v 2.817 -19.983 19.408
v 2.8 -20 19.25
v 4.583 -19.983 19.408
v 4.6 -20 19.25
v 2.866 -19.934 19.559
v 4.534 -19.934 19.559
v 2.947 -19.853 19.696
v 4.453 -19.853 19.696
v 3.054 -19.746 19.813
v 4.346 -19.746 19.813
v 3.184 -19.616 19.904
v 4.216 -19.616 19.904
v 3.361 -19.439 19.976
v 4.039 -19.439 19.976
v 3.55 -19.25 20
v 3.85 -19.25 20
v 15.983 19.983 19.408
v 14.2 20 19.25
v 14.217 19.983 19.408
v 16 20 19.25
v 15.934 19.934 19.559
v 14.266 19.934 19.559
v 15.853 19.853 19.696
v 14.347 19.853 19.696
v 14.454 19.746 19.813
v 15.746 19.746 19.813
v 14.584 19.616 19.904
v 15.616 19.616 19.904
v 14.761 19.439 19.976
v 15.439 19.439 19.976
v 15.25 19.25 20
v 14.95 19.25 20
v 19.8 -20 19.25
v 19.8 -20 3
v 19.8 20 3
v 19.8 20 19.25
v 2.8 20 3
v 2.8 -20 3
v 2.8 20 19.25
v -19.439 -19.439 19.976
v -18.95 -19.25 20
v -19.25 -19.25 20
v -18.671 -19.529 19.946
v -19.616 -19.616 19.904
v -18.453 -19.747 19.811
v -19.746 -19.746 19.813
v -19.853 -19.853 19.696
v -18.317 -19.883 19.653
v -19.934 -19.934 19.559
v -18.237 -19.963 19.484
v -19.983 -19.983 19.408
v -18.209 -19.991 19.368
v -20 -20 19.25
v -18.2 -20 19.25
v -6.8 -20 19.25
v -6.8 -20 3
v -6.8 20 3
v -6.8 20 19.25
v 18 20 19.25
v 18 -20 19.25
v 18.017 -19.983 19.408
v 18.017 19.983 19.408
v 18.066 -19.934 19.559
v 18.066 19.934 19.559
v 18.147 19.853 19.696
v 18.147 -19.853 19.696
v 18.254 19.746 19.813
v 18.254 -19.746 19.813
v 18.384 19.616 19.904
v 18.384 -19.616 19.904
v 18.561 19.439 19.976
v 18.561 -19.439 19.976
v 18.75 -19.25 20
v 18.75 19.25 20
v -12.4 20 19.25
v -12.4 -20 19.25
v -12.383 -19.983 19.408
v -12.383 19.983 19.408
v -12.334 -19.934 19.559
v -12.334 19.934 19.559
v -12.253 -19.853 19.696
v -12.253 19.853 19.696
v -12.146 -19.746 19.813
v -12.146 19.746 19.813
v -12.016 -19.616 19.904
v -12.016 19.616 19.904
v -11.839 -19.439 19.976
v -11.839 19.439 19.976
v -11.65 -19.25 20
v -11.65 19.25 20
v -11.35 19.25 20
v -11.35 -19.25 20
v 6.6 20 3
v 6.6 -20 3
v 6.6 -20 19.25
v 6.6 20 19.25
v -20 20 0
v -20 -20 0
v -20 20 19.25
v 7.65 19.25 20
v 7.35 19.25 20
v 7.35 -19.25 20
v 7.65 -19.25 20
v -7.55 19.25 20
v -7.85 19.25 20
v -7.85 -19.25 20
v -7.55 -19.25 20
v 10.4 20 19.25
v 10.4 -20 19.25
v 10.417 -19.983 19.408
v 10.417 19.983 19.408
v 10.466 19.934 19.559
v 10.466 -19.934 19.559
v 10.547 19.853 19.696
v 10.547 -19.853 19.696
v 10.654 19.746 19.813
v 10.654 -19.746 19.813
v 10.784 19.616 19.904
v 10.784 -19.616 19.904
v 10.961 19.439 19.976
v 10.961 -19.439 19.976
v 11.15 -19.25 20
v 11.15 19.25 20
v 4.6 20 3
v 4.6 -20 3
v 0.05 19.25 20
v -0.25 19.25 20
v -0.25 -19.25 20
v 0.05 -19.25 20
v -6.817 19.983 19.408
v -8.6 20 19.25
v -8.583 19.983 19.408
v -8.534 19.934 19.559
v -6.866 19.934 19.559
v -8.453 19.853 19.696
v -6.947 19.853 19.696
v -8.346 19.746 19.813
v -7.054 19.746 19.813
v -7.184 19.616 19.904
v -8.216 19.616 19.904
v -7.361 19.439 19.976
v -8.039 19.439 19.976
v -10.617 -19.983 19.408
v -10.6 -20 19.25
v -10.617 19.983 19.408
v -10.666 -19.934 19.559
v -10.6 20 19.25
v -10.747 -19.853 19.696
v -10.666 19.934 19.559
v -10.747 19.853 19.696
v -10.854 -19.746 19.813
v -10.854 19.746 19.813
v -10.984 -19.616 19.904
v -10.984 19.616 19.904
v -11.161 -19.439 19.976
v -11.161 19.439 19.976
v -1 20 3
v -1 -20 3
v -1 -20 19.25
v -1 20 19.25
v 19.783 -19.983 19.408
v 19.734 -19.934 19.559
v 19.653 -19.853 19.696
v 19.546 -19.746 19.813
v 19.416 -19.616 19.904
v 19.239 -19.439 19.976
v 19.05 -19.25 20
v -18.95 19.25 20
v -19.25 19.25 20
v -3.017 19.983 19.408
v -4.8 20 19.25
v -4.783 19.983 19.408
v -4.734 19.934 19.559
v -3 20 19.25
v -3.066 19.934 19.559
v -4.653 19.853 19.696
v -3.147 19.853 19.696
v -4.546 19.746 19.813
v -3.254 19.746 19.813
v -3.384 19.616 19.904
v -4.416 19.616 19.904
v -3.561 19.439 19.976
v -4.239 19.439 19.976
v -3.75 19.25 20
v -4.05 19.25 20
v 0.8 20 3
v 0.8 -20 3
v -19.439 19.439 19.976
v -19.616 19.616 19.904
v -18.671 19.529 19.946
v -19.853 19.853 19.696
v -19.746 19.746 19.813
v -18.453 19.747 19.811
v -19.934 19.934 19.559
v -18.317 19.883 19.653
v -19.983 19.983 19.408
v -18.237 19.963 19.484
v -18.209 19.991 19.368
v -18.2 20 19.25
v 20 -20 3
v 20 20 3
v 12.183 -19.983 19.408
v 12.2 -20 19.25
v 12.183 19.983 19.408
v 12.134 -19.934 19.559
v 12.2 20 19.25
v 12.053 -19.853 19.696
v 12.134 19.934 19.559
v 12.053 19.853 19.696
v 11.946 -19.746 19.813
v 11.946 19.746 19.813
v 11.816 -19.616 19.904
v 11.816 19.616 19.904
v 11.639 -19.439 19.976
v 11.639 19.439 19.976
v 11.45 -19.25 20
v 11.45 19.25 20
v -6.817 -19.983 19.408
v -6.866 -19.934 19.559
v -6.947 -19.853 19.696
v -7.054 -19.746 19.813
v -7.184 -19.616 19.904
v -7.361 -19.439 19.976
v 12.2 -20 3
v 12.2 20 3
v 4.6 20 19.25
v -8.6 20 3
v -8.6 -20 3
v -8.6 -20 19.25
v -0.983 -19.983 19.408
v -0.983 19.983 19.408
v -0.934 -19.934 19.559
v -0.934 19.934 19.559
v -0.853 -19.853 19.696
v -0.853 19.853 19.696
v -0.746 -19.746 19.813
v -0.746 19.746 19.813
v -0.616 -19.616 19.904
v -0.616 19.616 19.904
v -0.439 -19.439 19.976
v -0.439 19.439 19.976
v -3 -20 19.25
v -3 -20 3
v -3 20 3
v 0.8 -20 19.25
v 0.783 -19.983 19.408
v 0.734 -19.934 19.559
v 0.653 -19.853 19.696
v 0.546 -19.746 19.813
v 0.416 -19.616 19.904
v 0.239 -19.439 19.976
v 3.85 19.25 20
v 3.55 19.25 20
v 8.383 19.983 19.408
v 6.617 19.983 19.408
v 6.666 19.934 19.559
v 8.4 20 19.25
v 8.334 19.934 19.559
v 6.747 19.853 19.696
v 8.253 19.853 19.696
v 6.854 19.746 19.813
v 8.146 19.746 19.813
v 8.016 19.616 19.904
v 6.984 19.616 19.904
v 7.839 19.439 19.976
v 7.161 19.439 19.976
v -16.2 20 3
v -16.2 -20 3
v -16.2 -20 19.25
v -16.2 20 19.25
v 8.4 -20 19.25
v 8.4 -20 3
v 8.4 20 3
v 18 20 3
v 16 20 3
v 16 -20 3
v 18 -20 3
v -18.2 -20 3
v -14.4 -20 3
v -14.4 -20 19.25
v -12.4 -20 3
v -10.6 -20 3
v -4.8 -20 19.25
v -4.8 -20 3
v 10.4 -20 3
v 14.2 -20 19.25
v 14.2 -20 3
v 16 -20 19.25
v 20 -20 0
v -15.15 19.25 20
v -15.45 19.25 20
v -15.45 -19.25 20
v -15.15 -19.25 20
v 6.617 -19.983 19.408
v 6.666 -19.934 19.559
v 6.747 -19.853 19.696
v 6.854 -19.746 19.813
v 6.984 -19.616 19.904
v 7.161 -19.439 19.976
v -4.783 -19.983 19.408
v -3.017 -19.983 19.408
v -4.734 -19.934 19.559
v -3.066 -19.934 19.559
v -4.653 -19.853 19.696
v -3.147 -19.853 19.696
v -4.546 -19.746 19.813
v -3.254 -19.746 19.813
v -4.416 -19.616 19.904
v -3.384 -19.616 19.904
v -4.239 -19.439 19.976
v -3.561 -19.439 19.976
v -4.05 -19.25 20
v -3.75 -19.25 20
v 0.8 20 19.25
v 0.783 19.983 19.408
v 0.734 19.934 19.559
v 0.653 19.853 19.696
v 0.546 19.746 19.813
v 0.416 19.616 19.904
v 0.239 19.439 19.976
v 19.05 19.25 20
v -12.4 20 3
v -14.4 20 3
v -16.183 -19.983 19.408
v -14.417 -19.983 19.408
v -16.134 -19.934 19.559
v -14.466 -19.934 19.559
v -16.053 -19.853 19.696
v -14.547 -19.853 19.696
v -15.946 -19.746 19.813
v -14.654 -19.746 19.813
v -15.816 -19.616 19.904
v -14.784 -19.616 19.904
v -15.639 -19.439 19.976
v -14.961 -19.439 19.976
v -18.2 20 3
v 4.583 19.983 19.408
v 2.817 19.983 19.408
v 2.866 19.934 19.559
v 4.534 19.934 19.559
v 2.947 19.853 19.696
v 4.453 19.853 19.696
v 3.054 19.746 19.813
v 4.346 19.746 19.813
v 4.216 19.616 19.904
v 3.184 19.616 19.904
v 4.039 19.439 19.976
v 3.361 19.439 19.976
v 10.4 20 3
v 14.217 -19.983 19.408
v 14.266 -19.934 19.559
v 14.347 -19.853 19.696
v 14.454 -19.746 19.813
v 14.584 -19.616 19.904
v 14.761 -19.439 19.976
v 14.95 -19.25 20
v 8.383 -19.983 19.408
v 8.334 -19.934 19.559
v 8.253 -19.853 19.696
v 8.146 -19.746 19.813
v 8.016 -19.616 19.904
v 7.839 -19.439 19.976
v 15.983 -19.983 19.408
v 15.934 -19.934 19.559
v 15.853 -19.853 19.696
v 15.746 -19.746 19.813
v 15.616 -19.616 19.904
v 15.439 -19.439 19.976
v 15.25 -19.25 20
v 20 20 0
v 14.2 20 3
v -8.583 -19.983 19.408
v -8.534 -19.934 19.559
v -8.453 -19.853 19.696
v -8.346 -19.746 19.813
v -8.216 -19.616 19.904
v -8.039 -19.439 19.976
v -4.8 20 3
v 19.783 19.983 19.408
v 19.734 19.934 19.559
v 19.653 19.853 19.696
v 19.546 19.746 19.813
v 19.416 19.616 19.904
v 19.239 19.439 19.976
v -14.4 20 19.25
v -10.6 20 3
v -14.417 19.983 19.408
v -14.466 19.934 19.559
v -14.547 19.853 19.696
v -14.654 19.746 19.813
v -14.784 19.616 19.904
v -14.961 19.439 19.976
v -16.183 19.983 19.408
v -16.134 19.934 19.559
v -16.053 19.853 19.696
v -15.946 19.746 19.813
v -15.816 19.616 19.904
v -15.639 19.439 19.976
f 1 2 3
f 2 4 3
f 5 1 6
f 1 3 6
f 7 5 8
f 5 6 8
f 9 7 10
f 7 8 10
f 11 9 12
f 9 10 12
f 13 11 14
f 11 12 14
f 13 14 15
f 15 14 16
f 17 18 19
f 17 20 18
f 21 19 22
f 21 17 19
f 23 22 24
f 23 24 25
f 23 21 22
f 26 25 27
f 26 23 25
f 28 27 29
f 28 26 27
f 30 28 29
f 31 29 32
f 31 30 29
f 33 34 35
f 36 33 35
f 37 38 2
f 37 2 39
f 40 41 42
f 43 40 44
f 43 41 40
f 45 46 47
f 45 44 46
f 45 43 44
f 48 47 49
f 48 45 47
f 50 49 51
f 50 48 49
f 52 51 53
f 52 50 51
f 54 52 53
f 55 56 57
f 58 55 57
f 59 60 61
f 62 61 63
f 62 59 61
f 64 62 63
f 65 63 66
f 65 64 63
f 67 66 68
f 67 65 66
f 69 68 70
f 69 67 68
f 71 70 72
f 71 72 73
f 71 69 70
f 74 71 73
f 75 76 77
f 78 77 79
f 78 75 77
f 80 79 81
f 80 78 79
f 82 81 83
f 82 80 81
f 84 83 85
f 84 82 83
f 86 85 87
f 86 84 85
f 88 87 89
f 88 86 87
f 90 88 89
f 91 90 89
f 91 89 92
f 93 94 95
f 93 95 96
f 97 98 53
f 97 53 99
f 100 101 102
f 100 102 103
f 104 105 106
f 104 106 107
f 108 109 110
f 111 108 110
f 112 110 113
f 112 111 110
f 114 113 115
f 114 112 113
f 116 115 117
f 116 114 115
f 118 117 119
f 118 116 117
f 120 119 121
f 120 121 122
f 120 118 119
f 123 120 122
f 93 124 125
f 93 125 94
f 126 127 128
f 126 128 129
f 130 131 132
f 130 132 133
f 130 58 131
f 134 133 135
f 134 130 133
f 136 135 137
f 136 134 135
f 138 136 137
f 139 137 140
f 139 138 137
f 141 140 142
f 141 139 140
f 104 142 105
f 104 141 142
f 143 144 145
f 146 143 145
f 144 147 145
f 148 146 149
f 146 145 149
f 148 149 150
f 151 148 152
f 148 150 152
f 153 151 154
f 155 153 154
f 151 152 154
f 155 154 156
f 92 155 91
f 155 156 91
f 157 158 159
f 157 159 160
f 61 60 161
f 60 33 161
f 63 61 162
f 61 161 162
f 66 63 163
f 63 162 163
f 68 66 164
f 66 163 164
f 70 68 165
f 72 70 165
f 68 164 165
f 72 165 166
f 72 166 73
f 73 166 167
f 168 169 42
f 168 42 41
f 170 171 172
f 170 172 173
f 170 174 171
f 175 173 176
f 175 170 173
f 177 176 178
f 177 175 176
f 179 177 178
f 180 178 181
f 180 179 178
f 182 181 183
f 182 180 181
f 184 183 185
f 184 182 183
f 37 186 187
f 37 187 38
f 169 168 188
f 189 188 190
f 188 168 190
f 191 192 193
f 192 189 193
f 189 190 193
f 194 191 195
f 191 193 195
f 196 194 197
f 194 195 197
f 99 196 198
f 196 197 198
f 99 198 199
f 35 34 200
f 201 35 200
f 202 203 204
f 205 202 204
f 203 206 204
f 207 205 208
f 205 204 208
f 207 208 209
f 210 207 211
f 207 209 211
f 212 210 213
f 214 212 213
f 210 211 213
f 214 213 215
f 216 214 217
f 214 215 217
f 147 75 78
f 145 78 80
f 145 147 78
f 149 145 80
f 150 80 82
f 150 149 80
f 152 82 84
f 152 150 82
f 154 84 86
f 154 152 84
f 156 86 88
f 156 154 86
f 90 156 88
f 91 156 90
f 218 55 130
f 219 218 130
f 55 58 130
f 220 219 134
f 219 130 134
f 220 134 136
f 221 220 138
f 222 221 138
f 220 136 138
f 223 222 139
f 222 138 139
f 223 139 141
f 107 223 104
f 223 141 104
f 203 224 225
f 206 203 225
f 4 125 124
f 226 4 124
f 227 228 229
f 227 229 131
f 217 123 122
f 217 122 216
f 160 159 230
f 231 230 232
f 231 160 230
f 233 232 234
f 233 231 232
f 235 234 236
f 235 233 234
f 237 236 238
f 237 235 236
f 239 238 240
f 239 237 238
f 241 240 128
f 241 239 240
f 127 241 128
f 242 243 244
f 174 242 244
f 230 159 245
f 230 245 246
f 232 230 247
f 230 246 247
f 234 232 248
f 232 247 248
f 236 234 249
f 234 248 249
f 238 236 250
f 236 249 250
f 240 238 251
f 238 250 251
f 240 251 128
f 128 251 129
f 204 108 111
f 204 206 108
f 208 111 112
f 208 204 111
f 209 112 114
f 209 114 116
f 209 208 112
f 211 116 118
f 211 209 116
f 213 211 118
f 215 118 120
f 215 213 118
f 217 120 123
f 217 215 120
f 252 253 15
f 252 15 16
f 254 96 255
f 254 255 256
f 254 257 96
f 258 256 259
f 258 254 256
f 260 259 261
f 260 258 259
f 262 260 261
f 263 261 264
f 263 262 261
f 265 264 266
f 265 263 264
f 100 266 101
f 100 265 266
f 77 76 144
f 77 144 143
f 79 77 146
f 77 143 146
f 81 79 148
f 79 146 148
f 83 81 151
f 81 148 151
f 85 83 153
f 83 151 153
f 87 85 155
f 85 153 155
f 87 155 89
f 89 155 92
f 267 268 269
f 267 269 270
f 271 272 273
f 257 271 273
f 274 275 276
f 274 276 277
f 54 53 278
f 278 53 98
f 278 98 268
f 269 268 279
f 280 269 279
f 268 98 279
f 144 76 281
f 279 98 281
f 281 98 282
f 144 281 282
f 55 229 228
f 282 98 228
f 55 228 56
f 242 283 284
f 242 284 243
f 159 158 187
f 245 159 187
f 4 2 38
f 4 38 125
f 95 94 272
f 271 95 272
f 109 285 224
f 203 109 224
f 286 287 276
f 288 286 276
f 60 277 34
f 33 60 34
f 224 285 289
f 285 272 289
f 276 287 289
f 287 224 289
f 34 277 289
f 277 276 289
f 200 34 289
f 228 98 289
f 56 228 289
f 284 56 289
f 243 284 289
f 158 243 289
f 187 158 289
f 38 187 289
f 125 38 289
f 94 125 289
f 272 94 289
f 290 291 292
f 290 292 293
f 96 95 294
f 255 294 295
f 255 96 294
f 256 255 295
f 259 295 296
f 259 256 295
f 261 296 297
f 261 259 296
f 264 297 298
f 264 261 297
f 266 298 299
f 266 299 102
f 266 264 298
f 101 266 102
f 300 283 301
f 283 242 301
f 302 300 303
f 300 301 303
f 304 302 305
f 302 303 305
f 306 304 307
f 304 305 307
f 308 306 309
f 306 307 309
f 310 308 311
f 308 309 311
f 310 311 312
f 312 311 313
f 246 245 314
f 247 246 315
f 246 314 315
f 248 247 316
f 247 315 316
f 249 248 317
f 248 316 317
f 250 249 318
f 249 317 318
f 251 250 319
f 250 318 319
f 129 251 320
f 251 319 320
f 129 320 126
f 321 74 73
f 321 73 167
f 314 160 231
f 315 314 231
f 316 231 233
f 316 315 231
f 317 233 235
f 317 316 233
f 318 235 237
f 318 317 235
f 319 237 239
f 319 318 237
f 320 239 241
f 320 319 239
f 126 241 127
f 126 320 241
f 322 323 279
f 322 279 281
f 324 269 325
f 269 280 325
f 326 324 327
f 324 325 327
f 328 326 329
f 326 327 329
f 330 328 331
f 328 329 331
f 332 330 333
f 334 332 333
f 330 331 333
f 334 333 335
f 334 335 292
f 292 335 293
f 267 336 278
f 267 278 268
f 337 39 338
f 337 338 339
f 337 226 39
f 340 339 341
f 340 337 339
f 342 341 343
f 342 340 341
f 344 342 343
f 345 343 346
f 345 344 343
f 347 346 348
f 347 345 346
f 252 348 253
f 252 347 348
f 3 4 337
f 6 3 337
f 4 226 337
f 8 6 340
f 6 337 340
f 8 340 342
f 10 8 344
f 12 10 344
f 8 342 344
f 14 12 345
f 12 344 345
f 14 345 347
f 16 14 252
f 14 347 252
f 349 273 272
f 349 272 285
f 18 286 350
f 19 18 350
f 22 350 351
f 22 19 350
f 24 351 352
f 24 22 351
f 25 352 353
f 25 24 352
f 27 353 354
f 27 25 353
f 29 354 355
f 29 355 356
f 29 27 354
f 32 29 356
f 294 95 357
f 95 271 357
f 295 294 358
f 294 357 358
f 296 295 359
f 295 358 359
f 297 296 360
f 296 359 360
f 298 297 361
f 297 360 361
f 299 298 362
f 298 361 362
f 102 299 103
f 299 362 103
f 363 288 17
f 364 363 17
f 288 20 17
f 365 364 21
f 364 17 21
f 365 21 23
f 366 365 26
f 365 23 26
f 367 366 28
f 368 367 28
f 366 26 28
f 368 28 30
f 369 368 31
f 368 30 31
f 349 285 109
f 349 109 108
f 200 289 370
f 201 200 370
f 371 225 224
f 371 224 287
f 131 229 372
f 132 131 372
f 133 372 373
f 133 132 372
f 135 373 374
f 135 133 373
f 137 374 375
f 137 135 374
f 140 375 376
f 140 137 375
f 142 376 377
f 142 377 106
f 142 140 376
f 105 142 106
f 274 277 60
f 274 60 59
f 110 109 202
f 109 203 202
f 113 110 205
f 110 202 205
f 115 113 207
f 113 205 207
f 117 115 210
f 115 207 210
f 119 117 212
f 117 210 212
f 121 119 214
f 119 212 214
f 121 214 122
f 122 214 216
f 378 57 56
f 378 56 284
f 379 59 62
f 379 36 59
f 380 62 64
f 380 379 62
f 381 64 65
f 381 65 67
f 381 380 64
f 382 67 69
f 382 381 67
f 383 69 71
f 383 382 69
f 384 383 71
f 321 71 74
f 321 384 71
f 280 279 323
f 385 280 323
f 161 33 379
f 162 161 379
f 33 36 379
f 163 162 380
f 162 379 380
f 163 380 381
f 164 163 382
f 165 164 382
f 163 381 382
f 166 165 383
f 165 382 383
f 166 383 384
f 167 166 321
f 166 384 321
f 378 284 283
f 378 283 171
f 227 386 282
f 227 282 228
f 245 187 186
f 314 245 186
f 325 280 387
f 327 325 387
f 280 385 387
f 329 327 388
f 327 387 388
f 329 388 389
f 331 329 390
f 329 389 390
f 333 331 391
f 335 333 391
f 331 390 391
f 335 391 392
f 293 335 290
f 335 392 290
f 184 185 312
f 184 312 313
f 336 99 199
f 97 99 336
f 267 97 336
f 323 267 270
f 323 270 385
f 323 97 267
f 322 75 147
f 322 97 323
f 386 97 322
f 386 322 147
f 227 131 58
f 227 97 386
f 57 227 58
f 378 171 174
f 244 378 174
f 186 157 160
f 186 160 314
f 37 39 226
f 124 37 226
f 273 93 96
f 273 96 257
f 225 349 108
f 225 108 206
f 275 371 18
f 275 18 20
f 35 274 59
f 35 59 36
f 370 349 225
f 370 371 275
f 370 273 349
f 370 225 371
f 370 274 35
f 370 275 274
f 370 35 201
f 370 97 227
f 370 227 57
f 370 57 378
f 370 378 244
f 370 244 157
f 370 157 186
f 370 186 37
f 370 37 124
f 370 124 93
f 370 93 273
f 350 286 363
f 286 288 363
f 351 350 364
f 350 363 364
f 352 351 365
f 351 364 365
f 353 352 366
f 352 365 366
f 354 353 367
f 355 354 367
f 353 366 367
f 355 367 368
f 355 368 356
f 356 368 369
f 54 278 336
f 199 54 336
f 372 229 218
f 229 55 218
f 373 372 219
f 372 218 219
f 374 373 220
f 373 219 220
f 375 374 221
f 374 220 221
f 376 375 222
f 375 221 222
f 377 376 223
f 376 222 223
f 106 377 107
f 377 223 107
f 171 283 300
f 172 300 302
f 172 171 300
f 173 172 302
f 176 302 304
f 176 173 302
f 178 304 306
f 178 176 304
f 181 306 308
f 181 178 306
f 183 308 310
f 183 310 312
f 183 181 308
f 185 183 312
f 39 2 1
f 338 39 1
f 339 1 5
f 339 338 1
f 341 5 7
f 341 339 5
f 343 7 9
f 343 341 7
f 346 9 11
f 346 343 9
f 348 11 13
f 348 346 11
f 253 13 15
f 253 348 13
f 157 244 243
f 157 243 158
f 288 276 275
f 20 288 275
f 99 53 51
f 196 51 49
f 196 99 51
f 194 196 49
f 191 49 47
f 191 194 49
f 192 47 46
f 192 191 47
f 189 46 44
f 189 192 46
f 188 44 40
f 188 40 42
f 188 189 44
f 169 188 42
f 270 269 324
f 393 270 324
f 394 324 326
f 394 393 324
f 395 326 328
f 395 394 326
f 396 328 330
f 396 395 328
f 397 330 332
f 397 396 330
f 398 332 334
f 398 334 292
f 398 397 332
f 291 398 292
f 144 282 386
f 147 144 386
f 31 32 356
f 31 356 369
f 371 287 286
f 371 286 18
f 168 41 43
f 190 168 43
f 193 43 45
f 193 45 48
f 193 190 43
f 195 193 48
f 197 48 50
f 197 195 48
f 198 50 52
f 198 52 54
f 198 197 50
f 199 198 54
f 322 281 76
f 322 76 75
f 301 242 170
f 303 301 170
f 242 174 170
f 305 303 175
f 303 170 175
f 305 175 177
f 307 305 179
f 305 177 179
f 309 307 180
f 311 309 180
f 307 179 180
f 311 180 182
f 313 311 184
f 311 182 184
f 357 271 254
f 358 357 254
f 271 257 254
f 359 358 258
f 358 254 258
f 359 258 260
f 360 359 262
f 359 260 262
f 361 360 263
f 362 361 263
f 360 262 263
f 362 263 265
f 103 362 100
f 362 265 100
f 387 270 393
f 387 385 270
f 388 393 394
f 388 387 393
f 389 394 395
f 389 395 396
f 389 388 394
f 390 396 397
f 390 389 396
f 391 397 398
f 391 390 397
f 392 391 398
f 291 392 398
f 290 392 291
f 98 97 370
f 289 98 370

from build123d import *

# Parameters (mm, degrees)
SKETCH1_W           = 40
SKETCH1_H           = 40
BOSS_EXTRUDE1_DEPTH = 3
SKETCH2_W           = 1.8
SKETCH2_H           = 40
BOSS_EXTRUDE2_DEPTH = 17
LPATTERN1_COUNT     = 11
LPATTERN1_PITCH     = 3.8
FILLET1_R           = 0.75


with BuildPart() as part:
    # Sketch1 → Boss-Extrude1 (new body)
    with BuildSketch(Plane.XY):
        Rectangle(SKETCH1_W, SKETCH1_H)
    extrude(amount=BOSS_EXTRUDE1_DEPTH)

    # Sketch2 → Boss-Extrude2 (add)
    with BuildSketch(Plane.XY.offset(3)):
        with Locations((-19.1, 0)):
            Rectangle(SKETCH2_W, SKETCH2_H)
    boss_extrude2 = extrude(amount=BOSS_EXTRUDE2_DEPTH)

    # LPattern1: Boss-Extrude2 ×11
    with Locations(*[(i * LPATTERN1_PITCH, 0, 0) for i in range(1, LPATTERN1_COUNT)]):
        add(boss_extrude2)

    # Fillet1
    fillet1_edges = [part.edges().sort_by_distance(p)[0] for p in [
        (10.4, 0, 20),
        (11.3, -20, 20),
        (12.2, 0, 20),
        (11.3, 20, 20),
        (14.2, 0, 20),
        (15.1, -20, 20),
        (16, 0, 20),
        (15.1, 20, 20),
        (18, 0, 20),
        (18.9, -20, 20),
        (19.8, 0, 20),
        (18.9, 20, 20),
        (-20, 0, 20),
        (-19.1, -20, 20),
        (-18.2, 0, 20),
        (-19.1, 20, 20),
        (-16.2, 0, 20),
        (-15.3, -20, 20),
        (-14.4, 0, 20),
        (-15.3, 20, 20),
        (-12.4, 0, 20),
        (-11.5, -20, 20),
        (-10.6, 0, 20),
        (-11.5, 20, 20),
        (-8.6, 0, 20),
        (-7.7, -20, 20),
        (-6.8, 0, 20),
        (-7.7, 20, 20),
        (-4.8, 0, 20),
        (-3.9, -20, 20),
        (-3, 0, 20),
        (-3.9, 20, 20),
        (-1, 0, 20),
        (-0.1, -20, 20),
        (0.8, 0, 20),
        (-0.1, 20, 20),
        (2.8, 0, 20),
        (3.7, -20, 20),
        (4.6, 0, 20),
        (3.7, 20, 20),
        (6.6, 0, 20),
        (7.5, -20, 20),
        (8.4, 0, 20),
        (7.5, 20, 20),
    ]]
    fillet(fillet1_edges, radius=FILLET1_R)


solid = part.part
